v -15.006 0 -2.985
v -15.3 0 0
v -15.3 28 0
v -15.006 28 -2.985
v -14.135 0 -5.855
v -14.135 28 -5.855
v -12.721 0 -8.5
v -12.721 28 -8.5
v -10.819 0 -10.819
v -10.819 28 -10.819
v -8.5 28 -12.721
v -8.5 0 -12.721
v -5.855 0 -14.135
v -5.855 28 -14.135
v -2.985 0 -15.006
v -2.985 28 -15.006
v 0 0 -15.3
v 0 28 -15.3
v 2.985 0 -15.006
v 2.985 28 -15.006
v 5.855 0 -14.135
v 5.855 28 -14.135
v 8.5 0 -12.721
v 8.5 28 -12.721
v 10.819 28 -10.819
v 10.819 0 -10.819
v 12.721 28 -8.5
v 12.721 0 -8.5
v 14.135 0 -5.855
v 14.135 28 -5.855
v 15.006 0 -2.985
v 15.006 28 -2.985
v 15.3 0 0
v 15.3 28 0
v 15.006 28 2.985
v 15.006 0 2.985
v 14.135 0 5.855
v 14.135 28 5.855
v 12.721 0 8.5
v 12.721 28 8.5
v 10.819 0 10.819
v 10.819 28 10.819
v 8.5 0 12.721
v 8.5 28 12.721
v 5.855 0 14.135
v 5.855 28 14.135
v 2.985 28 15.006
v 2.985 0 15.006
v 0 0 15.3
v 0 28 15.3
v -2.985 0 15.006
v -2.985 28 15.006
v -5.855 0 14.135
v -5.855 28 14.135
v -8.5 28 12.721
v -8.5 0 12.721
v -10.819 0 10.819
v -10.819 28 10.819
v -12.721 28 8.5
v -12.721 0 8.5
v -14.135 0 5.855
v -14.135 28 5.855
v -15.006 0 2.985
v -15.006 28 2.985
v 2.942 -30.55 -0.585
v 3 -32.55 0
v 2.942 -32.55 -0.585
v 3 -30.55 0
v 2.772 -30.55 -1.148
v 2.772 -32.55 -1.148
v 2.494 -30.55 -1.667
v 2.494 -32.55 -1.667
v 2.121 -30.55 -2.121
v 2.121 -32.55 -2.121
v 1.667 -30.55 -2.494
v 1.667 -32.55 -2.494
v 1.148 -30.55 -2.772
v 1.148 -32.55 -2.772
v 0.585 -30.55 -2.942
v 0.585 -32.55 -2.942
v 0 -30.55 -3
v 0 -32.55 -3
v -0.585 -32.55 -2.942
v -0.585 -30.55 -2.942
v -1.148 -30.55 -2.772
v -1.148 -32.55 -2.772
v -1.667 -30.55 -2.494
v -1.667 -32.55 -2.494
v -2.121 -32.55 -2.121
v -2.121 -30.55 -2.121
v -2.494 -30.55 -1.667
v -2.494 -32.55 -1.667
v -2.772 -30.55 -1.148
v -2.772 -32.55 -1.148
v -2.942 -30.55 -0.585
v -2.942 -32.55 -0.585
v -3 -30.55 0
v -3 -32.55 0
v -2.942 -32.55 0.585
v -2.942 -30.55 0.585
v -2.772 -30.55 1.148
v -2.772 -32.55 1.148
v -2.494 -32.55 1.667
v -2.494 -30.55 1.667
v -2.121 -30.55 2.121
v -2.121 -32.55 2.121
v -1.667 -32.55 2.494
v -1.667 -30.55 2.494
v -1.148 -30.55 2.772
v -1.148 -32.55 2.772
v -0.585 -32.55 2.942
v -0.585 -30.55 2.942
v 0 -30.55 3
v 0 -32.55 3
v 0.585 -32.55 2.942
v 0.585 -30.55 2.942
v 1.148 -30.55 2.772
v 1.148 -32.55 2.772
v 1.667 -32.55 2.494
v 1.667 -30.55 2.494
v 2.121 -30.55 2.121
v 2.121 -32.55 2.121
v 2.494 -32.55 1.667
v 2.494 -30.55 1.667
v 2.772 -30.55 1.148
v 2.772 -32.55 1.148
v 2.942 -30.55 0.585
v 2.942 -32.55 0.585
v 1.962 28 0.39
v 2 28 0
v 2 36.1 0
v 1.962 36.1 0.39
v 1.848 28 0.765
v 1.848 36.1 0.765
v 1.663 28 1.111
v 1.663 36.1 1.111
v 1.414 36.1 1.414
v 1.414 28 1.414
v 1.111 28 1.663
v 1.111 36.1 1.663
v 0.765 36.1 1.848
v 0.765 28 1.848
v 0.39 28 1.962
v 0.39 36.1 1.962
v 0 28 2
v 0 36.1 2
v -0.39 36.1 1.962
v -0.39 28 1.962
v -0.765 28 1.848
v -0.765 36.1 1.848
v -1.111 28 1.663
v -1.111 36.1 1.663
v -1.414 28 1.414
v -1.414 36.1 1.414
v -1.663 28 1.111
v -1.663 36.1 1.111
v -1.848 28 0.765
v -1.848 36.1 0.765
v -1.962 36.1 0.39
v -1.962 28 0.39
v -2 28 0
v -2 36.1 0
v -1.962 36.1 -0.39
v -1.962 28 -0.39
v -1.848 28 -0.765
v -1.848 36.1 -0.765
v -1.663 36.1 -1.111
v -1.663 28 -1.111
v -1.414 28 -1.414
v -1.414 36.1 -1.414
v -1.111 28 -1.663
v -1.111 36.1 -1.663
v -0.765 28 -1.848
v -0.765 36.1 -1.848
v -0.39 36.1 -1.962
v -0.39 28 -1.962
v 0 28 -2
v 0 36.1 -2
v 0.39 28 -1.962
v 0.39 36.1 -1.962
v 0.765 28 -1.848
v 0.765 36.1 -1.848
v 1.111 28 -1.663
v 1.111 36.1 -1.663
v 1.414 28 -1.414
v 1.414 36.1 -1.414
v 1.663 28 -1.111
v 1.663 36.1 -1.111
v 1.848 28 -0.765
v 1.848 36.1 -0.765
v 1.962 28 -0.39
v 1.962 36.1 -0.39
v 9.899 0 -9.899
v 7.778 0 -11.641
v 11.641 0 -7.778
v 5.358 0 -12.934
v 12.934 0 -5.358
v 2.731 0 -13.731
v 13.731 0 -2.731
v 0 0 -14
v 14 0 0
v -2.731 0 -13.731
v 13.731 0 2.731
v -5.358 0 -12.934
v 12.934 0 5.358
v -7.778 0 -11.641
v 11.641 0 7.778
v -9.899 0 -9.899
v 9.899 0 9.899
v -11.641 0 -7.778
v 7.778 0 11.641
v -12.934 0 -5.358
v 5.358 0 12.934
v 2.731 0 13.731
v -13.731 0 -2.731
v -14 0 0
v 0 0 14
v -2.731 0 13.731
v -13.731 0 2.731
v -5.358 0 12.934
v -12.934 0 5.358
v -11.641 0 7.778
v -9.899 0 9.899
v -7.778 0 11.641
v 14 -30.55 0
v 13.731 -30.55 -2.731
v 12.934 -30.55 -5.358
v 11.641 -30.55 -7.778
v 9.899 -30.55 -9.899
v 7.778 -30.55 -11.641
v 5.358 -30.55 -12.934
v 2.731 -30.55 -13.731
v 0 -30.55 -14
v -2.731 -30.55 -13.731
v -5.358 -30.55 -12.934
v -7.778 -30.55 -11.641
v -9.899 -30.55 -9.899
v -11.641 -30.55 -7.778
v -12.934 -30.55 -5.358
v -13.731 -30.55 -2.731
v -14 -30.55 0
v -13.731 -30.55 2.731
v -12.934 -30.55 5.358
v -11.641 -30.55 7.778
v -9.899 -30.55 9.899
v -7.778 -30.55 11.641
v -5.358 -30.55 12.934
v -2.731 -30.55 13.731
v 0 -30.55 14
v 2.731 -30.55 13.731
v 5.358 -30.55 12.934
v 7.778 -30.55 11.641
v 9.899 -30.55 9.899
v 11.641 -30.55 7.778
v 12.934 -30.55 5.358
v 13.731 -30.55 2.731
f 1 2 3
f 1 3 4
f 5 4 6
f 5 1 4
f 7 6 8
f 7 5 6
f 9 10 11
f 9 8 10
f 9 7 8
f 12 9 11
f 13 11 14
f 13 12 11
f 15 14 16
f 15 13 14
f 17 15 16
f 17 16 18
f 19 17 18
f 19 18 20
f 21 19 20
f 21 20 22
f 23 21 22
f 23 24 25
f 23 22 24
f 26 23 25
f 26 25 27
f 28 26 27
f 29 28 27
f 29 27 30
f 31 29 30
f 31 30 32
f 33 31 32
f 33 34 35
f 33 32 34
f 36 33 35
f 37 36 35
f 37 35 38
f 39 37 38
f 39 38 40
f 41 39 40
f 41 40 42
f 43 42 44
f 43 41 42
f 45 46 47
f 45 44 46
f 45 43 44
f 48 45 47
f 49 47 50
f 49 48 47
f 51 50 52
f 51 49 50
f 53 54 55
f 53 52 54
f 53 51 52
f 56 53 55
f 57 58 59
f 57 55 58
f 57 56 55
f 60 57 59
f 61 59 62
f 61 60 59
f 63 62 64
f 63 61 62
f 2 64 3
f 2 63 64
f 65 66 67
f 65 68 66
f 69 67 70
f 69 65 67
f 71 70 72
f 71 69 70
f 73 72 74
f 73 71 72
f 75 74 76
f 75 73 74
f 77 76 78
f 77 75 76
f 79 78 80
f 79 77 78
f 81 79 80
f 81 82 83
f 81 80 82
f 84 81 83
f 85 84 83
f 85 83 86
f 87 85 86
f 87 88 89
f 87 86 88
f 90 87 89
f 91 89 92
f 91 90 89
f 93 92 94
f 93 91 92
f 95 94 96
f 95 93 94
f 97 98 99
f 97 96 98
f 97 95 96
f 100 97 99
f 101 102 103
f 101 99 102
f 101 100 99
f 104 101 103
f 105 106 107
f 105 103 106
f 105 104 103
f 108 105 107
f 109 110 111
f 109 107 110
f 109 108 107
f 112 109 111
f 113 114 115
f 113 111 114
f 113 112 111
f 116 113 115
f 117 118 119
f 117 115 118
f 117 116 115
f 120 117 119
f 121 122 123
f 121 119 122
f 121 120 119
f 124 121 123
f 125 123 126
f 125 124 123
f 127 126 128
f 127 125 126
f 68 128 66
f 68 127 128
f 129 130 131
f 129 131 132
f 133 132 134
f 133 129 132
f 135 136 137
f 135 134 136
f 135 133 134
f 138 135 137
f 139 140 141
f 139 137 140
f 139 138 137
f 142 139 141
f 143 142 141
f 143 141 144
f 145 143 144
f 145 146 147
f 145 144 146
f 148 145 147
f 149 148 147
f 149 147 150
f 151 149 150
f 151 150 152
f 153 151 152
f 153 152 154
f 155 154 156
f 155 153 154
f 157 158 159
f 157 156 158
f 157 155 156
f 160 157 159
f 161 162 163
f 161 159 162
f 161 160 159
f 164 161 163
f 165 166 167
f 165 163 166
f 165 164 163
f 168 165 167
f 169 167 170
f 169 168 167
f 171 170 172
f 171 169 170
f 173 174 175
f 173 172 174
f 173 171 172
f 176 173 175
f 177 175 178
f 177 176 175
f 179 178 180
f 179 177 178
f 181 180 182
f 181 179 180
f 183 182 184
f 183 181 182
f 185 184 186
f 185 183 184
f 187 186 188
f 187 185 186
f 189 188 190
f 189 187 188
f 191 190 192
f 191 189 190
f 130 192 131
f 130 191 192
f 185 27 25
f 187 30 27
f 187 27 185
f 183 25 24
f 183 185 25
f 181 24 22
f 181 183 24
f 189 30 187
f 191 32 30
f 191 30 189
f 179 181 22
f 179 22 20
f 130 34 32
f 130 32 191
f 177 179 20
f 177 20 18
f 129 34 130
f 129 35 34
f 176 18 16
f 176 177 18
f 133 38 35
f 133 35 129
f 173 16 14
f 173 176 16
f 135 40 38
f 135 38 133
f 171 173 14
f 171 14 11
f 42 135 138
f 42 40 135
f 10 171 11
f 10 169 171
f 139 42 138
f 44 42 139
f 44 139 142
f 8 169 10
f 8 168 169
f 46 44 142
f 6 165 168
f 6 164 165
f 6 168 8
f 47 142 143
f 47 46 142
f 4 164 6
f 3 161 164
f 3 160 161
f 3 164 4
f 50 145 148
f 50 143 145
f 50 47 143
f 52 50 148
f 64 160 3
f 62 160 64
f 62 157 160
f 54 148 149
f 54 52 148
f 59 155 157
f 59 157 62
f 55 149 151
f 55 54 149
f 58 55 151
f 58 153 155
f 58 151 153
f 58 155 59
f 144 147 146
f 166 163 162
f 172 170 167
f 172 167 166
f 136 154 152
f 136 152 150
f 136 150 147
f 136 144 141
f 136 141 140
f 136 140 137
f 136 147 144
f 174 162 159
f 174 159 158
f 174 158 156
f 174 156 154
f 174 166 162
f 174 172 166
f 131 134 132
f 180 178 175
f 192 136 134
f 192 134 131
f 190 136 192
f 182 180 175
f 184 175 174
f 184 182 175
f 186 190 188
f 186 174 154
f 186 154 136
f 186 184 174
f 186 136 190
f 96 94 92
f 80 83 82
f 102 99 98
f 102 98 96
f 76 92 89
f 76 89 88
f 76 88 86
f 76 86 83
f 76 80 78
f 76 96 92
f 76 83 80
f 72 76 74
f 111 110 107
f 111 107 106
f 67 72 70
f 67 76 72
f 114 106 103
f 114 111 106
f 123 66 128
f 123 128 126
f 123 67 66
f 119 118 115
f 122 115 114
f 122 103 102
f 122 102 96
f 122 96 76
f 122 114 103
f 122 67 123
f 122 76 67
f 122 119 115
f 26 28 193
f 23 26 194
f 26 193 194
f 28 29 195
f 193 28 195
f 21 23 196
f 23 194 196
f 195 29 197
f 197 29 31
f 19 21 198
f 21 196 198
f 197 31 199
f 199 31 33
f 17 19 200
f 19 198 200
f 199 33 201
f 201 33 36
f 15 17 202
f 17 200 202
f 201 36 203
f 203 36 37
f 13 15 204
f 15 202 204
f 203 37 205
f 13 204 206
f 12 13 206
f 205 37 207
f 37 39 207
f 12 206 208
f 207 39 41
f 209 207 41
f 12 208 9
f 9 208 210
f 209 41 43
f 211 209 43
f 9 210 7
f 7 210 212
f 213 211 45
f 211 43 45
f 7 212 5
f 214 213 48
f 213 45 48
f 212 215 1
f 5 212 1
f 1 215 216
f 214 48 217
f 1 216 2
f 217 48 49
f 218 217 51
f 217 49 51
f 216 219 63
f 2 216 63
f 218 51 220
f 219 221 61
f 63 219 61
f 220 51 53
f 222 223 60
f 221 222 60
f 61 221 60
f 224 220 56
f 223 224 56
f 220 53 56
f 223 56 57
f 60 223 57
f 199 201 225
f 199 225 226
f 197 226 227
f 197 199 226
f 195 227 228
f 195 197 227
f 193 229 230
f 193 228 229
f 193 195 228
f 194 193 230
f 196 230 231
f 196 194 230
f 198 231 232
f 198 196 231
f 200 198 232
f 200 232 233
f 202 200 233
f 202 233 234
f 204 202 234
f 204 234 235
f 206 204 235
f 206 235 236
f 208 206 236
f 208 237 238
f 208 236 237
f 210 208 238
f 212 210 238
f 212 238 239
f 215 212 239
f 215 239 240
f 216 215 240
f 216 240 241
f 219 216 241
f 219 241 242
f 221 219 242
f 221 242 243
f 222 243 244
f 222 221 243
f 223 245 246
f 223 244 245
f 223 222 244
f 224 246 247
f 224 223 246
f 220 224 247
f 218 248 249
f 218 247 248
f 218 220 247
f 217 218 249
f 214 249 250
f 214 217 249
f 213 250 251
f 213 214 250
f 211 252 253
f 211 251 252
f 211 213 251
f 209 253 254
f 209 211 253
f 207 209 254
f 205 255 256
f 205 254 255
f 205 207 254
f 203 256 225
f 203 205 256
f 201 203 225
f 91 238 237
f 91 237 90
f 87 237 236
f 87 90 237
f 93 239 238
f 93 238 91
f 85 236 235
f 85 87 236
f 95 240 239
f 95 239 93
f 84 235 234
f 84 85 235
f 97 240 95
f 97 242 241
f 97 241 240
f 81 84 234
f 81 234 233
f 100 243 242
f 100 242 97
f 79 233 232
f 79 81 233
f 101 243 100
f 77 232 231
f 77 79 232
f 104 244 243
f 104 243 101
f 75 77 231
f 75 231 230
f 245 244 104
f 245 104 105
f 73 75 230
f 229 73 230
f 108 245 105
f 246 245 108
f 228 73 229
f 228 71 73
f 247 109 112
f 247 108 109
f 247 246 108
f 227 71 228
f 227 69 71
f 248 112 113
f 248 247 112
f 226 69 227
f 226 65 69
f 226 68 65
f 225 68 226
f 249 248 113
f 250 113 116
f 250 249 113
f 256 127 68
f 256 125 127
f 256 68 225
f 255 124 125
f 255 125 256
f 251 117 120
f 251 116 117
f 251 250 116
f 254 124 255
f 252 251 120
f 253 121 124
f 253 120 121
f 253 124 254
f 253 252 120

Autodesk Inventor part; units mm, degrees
ref_plane "YZ Plane" through (0, 0, 0) normal (1, 0, 0) x (0, 1, 0)
ref_plane "XZ Plane" through (0, 0, 0) normal (0, 1, 0) x (-1, 0, 0)
ref_plane "XY Plane" through (0, 0, 0) normal (0, 0, 1) x (1, 0, 0)
sketch "Sketch1" plane through (0, 0, 0) normal (0, 1, 0) x (-1, 0, 0)
  circle A0 centre (0, 0) radius 13.3
  circle A1 centre (0, 0) radius 15.3
  dimension "d0" = 26.6
  dimension "d1" = 2
extrude "Extrusion1" add sketch "Sketch1" along normal blind 28 contours A0 | A1
sketch "Sketch2" plane through (0, 0, 0) normal (0, -1, 0) x (1, 0, 0)
  circle A0 centre (0, 0) radius 12
  circle A1 centre (0, 0) radius 14
  dimension "d4" = 24
  dimension "d5" = 2
extrude "Extrusion2" add sketch "Sketch2" along normal blind 30.55 contours A0 | A1
sketch "Sketch3" plane through (0, -30.55, 0) normal (0, -1, 0) x (1, 0, 0)
  circle A0 centre (0, 0) radius 3
  dimension "d8" = 6
extrude "Extrusion3" add sketch "Sketch3" along normal blind 2
sketch "Sketch4" plane through (0, 28, 0) normal (0, 1, 0) x (1, 0, 0)
  circle A0 centre (0, 0) radius 2
  dimension "d11" = 4
extrude "Extrusion4" add sketch "Sketch4" along normal blind 8.1
properties part number "Pump"
